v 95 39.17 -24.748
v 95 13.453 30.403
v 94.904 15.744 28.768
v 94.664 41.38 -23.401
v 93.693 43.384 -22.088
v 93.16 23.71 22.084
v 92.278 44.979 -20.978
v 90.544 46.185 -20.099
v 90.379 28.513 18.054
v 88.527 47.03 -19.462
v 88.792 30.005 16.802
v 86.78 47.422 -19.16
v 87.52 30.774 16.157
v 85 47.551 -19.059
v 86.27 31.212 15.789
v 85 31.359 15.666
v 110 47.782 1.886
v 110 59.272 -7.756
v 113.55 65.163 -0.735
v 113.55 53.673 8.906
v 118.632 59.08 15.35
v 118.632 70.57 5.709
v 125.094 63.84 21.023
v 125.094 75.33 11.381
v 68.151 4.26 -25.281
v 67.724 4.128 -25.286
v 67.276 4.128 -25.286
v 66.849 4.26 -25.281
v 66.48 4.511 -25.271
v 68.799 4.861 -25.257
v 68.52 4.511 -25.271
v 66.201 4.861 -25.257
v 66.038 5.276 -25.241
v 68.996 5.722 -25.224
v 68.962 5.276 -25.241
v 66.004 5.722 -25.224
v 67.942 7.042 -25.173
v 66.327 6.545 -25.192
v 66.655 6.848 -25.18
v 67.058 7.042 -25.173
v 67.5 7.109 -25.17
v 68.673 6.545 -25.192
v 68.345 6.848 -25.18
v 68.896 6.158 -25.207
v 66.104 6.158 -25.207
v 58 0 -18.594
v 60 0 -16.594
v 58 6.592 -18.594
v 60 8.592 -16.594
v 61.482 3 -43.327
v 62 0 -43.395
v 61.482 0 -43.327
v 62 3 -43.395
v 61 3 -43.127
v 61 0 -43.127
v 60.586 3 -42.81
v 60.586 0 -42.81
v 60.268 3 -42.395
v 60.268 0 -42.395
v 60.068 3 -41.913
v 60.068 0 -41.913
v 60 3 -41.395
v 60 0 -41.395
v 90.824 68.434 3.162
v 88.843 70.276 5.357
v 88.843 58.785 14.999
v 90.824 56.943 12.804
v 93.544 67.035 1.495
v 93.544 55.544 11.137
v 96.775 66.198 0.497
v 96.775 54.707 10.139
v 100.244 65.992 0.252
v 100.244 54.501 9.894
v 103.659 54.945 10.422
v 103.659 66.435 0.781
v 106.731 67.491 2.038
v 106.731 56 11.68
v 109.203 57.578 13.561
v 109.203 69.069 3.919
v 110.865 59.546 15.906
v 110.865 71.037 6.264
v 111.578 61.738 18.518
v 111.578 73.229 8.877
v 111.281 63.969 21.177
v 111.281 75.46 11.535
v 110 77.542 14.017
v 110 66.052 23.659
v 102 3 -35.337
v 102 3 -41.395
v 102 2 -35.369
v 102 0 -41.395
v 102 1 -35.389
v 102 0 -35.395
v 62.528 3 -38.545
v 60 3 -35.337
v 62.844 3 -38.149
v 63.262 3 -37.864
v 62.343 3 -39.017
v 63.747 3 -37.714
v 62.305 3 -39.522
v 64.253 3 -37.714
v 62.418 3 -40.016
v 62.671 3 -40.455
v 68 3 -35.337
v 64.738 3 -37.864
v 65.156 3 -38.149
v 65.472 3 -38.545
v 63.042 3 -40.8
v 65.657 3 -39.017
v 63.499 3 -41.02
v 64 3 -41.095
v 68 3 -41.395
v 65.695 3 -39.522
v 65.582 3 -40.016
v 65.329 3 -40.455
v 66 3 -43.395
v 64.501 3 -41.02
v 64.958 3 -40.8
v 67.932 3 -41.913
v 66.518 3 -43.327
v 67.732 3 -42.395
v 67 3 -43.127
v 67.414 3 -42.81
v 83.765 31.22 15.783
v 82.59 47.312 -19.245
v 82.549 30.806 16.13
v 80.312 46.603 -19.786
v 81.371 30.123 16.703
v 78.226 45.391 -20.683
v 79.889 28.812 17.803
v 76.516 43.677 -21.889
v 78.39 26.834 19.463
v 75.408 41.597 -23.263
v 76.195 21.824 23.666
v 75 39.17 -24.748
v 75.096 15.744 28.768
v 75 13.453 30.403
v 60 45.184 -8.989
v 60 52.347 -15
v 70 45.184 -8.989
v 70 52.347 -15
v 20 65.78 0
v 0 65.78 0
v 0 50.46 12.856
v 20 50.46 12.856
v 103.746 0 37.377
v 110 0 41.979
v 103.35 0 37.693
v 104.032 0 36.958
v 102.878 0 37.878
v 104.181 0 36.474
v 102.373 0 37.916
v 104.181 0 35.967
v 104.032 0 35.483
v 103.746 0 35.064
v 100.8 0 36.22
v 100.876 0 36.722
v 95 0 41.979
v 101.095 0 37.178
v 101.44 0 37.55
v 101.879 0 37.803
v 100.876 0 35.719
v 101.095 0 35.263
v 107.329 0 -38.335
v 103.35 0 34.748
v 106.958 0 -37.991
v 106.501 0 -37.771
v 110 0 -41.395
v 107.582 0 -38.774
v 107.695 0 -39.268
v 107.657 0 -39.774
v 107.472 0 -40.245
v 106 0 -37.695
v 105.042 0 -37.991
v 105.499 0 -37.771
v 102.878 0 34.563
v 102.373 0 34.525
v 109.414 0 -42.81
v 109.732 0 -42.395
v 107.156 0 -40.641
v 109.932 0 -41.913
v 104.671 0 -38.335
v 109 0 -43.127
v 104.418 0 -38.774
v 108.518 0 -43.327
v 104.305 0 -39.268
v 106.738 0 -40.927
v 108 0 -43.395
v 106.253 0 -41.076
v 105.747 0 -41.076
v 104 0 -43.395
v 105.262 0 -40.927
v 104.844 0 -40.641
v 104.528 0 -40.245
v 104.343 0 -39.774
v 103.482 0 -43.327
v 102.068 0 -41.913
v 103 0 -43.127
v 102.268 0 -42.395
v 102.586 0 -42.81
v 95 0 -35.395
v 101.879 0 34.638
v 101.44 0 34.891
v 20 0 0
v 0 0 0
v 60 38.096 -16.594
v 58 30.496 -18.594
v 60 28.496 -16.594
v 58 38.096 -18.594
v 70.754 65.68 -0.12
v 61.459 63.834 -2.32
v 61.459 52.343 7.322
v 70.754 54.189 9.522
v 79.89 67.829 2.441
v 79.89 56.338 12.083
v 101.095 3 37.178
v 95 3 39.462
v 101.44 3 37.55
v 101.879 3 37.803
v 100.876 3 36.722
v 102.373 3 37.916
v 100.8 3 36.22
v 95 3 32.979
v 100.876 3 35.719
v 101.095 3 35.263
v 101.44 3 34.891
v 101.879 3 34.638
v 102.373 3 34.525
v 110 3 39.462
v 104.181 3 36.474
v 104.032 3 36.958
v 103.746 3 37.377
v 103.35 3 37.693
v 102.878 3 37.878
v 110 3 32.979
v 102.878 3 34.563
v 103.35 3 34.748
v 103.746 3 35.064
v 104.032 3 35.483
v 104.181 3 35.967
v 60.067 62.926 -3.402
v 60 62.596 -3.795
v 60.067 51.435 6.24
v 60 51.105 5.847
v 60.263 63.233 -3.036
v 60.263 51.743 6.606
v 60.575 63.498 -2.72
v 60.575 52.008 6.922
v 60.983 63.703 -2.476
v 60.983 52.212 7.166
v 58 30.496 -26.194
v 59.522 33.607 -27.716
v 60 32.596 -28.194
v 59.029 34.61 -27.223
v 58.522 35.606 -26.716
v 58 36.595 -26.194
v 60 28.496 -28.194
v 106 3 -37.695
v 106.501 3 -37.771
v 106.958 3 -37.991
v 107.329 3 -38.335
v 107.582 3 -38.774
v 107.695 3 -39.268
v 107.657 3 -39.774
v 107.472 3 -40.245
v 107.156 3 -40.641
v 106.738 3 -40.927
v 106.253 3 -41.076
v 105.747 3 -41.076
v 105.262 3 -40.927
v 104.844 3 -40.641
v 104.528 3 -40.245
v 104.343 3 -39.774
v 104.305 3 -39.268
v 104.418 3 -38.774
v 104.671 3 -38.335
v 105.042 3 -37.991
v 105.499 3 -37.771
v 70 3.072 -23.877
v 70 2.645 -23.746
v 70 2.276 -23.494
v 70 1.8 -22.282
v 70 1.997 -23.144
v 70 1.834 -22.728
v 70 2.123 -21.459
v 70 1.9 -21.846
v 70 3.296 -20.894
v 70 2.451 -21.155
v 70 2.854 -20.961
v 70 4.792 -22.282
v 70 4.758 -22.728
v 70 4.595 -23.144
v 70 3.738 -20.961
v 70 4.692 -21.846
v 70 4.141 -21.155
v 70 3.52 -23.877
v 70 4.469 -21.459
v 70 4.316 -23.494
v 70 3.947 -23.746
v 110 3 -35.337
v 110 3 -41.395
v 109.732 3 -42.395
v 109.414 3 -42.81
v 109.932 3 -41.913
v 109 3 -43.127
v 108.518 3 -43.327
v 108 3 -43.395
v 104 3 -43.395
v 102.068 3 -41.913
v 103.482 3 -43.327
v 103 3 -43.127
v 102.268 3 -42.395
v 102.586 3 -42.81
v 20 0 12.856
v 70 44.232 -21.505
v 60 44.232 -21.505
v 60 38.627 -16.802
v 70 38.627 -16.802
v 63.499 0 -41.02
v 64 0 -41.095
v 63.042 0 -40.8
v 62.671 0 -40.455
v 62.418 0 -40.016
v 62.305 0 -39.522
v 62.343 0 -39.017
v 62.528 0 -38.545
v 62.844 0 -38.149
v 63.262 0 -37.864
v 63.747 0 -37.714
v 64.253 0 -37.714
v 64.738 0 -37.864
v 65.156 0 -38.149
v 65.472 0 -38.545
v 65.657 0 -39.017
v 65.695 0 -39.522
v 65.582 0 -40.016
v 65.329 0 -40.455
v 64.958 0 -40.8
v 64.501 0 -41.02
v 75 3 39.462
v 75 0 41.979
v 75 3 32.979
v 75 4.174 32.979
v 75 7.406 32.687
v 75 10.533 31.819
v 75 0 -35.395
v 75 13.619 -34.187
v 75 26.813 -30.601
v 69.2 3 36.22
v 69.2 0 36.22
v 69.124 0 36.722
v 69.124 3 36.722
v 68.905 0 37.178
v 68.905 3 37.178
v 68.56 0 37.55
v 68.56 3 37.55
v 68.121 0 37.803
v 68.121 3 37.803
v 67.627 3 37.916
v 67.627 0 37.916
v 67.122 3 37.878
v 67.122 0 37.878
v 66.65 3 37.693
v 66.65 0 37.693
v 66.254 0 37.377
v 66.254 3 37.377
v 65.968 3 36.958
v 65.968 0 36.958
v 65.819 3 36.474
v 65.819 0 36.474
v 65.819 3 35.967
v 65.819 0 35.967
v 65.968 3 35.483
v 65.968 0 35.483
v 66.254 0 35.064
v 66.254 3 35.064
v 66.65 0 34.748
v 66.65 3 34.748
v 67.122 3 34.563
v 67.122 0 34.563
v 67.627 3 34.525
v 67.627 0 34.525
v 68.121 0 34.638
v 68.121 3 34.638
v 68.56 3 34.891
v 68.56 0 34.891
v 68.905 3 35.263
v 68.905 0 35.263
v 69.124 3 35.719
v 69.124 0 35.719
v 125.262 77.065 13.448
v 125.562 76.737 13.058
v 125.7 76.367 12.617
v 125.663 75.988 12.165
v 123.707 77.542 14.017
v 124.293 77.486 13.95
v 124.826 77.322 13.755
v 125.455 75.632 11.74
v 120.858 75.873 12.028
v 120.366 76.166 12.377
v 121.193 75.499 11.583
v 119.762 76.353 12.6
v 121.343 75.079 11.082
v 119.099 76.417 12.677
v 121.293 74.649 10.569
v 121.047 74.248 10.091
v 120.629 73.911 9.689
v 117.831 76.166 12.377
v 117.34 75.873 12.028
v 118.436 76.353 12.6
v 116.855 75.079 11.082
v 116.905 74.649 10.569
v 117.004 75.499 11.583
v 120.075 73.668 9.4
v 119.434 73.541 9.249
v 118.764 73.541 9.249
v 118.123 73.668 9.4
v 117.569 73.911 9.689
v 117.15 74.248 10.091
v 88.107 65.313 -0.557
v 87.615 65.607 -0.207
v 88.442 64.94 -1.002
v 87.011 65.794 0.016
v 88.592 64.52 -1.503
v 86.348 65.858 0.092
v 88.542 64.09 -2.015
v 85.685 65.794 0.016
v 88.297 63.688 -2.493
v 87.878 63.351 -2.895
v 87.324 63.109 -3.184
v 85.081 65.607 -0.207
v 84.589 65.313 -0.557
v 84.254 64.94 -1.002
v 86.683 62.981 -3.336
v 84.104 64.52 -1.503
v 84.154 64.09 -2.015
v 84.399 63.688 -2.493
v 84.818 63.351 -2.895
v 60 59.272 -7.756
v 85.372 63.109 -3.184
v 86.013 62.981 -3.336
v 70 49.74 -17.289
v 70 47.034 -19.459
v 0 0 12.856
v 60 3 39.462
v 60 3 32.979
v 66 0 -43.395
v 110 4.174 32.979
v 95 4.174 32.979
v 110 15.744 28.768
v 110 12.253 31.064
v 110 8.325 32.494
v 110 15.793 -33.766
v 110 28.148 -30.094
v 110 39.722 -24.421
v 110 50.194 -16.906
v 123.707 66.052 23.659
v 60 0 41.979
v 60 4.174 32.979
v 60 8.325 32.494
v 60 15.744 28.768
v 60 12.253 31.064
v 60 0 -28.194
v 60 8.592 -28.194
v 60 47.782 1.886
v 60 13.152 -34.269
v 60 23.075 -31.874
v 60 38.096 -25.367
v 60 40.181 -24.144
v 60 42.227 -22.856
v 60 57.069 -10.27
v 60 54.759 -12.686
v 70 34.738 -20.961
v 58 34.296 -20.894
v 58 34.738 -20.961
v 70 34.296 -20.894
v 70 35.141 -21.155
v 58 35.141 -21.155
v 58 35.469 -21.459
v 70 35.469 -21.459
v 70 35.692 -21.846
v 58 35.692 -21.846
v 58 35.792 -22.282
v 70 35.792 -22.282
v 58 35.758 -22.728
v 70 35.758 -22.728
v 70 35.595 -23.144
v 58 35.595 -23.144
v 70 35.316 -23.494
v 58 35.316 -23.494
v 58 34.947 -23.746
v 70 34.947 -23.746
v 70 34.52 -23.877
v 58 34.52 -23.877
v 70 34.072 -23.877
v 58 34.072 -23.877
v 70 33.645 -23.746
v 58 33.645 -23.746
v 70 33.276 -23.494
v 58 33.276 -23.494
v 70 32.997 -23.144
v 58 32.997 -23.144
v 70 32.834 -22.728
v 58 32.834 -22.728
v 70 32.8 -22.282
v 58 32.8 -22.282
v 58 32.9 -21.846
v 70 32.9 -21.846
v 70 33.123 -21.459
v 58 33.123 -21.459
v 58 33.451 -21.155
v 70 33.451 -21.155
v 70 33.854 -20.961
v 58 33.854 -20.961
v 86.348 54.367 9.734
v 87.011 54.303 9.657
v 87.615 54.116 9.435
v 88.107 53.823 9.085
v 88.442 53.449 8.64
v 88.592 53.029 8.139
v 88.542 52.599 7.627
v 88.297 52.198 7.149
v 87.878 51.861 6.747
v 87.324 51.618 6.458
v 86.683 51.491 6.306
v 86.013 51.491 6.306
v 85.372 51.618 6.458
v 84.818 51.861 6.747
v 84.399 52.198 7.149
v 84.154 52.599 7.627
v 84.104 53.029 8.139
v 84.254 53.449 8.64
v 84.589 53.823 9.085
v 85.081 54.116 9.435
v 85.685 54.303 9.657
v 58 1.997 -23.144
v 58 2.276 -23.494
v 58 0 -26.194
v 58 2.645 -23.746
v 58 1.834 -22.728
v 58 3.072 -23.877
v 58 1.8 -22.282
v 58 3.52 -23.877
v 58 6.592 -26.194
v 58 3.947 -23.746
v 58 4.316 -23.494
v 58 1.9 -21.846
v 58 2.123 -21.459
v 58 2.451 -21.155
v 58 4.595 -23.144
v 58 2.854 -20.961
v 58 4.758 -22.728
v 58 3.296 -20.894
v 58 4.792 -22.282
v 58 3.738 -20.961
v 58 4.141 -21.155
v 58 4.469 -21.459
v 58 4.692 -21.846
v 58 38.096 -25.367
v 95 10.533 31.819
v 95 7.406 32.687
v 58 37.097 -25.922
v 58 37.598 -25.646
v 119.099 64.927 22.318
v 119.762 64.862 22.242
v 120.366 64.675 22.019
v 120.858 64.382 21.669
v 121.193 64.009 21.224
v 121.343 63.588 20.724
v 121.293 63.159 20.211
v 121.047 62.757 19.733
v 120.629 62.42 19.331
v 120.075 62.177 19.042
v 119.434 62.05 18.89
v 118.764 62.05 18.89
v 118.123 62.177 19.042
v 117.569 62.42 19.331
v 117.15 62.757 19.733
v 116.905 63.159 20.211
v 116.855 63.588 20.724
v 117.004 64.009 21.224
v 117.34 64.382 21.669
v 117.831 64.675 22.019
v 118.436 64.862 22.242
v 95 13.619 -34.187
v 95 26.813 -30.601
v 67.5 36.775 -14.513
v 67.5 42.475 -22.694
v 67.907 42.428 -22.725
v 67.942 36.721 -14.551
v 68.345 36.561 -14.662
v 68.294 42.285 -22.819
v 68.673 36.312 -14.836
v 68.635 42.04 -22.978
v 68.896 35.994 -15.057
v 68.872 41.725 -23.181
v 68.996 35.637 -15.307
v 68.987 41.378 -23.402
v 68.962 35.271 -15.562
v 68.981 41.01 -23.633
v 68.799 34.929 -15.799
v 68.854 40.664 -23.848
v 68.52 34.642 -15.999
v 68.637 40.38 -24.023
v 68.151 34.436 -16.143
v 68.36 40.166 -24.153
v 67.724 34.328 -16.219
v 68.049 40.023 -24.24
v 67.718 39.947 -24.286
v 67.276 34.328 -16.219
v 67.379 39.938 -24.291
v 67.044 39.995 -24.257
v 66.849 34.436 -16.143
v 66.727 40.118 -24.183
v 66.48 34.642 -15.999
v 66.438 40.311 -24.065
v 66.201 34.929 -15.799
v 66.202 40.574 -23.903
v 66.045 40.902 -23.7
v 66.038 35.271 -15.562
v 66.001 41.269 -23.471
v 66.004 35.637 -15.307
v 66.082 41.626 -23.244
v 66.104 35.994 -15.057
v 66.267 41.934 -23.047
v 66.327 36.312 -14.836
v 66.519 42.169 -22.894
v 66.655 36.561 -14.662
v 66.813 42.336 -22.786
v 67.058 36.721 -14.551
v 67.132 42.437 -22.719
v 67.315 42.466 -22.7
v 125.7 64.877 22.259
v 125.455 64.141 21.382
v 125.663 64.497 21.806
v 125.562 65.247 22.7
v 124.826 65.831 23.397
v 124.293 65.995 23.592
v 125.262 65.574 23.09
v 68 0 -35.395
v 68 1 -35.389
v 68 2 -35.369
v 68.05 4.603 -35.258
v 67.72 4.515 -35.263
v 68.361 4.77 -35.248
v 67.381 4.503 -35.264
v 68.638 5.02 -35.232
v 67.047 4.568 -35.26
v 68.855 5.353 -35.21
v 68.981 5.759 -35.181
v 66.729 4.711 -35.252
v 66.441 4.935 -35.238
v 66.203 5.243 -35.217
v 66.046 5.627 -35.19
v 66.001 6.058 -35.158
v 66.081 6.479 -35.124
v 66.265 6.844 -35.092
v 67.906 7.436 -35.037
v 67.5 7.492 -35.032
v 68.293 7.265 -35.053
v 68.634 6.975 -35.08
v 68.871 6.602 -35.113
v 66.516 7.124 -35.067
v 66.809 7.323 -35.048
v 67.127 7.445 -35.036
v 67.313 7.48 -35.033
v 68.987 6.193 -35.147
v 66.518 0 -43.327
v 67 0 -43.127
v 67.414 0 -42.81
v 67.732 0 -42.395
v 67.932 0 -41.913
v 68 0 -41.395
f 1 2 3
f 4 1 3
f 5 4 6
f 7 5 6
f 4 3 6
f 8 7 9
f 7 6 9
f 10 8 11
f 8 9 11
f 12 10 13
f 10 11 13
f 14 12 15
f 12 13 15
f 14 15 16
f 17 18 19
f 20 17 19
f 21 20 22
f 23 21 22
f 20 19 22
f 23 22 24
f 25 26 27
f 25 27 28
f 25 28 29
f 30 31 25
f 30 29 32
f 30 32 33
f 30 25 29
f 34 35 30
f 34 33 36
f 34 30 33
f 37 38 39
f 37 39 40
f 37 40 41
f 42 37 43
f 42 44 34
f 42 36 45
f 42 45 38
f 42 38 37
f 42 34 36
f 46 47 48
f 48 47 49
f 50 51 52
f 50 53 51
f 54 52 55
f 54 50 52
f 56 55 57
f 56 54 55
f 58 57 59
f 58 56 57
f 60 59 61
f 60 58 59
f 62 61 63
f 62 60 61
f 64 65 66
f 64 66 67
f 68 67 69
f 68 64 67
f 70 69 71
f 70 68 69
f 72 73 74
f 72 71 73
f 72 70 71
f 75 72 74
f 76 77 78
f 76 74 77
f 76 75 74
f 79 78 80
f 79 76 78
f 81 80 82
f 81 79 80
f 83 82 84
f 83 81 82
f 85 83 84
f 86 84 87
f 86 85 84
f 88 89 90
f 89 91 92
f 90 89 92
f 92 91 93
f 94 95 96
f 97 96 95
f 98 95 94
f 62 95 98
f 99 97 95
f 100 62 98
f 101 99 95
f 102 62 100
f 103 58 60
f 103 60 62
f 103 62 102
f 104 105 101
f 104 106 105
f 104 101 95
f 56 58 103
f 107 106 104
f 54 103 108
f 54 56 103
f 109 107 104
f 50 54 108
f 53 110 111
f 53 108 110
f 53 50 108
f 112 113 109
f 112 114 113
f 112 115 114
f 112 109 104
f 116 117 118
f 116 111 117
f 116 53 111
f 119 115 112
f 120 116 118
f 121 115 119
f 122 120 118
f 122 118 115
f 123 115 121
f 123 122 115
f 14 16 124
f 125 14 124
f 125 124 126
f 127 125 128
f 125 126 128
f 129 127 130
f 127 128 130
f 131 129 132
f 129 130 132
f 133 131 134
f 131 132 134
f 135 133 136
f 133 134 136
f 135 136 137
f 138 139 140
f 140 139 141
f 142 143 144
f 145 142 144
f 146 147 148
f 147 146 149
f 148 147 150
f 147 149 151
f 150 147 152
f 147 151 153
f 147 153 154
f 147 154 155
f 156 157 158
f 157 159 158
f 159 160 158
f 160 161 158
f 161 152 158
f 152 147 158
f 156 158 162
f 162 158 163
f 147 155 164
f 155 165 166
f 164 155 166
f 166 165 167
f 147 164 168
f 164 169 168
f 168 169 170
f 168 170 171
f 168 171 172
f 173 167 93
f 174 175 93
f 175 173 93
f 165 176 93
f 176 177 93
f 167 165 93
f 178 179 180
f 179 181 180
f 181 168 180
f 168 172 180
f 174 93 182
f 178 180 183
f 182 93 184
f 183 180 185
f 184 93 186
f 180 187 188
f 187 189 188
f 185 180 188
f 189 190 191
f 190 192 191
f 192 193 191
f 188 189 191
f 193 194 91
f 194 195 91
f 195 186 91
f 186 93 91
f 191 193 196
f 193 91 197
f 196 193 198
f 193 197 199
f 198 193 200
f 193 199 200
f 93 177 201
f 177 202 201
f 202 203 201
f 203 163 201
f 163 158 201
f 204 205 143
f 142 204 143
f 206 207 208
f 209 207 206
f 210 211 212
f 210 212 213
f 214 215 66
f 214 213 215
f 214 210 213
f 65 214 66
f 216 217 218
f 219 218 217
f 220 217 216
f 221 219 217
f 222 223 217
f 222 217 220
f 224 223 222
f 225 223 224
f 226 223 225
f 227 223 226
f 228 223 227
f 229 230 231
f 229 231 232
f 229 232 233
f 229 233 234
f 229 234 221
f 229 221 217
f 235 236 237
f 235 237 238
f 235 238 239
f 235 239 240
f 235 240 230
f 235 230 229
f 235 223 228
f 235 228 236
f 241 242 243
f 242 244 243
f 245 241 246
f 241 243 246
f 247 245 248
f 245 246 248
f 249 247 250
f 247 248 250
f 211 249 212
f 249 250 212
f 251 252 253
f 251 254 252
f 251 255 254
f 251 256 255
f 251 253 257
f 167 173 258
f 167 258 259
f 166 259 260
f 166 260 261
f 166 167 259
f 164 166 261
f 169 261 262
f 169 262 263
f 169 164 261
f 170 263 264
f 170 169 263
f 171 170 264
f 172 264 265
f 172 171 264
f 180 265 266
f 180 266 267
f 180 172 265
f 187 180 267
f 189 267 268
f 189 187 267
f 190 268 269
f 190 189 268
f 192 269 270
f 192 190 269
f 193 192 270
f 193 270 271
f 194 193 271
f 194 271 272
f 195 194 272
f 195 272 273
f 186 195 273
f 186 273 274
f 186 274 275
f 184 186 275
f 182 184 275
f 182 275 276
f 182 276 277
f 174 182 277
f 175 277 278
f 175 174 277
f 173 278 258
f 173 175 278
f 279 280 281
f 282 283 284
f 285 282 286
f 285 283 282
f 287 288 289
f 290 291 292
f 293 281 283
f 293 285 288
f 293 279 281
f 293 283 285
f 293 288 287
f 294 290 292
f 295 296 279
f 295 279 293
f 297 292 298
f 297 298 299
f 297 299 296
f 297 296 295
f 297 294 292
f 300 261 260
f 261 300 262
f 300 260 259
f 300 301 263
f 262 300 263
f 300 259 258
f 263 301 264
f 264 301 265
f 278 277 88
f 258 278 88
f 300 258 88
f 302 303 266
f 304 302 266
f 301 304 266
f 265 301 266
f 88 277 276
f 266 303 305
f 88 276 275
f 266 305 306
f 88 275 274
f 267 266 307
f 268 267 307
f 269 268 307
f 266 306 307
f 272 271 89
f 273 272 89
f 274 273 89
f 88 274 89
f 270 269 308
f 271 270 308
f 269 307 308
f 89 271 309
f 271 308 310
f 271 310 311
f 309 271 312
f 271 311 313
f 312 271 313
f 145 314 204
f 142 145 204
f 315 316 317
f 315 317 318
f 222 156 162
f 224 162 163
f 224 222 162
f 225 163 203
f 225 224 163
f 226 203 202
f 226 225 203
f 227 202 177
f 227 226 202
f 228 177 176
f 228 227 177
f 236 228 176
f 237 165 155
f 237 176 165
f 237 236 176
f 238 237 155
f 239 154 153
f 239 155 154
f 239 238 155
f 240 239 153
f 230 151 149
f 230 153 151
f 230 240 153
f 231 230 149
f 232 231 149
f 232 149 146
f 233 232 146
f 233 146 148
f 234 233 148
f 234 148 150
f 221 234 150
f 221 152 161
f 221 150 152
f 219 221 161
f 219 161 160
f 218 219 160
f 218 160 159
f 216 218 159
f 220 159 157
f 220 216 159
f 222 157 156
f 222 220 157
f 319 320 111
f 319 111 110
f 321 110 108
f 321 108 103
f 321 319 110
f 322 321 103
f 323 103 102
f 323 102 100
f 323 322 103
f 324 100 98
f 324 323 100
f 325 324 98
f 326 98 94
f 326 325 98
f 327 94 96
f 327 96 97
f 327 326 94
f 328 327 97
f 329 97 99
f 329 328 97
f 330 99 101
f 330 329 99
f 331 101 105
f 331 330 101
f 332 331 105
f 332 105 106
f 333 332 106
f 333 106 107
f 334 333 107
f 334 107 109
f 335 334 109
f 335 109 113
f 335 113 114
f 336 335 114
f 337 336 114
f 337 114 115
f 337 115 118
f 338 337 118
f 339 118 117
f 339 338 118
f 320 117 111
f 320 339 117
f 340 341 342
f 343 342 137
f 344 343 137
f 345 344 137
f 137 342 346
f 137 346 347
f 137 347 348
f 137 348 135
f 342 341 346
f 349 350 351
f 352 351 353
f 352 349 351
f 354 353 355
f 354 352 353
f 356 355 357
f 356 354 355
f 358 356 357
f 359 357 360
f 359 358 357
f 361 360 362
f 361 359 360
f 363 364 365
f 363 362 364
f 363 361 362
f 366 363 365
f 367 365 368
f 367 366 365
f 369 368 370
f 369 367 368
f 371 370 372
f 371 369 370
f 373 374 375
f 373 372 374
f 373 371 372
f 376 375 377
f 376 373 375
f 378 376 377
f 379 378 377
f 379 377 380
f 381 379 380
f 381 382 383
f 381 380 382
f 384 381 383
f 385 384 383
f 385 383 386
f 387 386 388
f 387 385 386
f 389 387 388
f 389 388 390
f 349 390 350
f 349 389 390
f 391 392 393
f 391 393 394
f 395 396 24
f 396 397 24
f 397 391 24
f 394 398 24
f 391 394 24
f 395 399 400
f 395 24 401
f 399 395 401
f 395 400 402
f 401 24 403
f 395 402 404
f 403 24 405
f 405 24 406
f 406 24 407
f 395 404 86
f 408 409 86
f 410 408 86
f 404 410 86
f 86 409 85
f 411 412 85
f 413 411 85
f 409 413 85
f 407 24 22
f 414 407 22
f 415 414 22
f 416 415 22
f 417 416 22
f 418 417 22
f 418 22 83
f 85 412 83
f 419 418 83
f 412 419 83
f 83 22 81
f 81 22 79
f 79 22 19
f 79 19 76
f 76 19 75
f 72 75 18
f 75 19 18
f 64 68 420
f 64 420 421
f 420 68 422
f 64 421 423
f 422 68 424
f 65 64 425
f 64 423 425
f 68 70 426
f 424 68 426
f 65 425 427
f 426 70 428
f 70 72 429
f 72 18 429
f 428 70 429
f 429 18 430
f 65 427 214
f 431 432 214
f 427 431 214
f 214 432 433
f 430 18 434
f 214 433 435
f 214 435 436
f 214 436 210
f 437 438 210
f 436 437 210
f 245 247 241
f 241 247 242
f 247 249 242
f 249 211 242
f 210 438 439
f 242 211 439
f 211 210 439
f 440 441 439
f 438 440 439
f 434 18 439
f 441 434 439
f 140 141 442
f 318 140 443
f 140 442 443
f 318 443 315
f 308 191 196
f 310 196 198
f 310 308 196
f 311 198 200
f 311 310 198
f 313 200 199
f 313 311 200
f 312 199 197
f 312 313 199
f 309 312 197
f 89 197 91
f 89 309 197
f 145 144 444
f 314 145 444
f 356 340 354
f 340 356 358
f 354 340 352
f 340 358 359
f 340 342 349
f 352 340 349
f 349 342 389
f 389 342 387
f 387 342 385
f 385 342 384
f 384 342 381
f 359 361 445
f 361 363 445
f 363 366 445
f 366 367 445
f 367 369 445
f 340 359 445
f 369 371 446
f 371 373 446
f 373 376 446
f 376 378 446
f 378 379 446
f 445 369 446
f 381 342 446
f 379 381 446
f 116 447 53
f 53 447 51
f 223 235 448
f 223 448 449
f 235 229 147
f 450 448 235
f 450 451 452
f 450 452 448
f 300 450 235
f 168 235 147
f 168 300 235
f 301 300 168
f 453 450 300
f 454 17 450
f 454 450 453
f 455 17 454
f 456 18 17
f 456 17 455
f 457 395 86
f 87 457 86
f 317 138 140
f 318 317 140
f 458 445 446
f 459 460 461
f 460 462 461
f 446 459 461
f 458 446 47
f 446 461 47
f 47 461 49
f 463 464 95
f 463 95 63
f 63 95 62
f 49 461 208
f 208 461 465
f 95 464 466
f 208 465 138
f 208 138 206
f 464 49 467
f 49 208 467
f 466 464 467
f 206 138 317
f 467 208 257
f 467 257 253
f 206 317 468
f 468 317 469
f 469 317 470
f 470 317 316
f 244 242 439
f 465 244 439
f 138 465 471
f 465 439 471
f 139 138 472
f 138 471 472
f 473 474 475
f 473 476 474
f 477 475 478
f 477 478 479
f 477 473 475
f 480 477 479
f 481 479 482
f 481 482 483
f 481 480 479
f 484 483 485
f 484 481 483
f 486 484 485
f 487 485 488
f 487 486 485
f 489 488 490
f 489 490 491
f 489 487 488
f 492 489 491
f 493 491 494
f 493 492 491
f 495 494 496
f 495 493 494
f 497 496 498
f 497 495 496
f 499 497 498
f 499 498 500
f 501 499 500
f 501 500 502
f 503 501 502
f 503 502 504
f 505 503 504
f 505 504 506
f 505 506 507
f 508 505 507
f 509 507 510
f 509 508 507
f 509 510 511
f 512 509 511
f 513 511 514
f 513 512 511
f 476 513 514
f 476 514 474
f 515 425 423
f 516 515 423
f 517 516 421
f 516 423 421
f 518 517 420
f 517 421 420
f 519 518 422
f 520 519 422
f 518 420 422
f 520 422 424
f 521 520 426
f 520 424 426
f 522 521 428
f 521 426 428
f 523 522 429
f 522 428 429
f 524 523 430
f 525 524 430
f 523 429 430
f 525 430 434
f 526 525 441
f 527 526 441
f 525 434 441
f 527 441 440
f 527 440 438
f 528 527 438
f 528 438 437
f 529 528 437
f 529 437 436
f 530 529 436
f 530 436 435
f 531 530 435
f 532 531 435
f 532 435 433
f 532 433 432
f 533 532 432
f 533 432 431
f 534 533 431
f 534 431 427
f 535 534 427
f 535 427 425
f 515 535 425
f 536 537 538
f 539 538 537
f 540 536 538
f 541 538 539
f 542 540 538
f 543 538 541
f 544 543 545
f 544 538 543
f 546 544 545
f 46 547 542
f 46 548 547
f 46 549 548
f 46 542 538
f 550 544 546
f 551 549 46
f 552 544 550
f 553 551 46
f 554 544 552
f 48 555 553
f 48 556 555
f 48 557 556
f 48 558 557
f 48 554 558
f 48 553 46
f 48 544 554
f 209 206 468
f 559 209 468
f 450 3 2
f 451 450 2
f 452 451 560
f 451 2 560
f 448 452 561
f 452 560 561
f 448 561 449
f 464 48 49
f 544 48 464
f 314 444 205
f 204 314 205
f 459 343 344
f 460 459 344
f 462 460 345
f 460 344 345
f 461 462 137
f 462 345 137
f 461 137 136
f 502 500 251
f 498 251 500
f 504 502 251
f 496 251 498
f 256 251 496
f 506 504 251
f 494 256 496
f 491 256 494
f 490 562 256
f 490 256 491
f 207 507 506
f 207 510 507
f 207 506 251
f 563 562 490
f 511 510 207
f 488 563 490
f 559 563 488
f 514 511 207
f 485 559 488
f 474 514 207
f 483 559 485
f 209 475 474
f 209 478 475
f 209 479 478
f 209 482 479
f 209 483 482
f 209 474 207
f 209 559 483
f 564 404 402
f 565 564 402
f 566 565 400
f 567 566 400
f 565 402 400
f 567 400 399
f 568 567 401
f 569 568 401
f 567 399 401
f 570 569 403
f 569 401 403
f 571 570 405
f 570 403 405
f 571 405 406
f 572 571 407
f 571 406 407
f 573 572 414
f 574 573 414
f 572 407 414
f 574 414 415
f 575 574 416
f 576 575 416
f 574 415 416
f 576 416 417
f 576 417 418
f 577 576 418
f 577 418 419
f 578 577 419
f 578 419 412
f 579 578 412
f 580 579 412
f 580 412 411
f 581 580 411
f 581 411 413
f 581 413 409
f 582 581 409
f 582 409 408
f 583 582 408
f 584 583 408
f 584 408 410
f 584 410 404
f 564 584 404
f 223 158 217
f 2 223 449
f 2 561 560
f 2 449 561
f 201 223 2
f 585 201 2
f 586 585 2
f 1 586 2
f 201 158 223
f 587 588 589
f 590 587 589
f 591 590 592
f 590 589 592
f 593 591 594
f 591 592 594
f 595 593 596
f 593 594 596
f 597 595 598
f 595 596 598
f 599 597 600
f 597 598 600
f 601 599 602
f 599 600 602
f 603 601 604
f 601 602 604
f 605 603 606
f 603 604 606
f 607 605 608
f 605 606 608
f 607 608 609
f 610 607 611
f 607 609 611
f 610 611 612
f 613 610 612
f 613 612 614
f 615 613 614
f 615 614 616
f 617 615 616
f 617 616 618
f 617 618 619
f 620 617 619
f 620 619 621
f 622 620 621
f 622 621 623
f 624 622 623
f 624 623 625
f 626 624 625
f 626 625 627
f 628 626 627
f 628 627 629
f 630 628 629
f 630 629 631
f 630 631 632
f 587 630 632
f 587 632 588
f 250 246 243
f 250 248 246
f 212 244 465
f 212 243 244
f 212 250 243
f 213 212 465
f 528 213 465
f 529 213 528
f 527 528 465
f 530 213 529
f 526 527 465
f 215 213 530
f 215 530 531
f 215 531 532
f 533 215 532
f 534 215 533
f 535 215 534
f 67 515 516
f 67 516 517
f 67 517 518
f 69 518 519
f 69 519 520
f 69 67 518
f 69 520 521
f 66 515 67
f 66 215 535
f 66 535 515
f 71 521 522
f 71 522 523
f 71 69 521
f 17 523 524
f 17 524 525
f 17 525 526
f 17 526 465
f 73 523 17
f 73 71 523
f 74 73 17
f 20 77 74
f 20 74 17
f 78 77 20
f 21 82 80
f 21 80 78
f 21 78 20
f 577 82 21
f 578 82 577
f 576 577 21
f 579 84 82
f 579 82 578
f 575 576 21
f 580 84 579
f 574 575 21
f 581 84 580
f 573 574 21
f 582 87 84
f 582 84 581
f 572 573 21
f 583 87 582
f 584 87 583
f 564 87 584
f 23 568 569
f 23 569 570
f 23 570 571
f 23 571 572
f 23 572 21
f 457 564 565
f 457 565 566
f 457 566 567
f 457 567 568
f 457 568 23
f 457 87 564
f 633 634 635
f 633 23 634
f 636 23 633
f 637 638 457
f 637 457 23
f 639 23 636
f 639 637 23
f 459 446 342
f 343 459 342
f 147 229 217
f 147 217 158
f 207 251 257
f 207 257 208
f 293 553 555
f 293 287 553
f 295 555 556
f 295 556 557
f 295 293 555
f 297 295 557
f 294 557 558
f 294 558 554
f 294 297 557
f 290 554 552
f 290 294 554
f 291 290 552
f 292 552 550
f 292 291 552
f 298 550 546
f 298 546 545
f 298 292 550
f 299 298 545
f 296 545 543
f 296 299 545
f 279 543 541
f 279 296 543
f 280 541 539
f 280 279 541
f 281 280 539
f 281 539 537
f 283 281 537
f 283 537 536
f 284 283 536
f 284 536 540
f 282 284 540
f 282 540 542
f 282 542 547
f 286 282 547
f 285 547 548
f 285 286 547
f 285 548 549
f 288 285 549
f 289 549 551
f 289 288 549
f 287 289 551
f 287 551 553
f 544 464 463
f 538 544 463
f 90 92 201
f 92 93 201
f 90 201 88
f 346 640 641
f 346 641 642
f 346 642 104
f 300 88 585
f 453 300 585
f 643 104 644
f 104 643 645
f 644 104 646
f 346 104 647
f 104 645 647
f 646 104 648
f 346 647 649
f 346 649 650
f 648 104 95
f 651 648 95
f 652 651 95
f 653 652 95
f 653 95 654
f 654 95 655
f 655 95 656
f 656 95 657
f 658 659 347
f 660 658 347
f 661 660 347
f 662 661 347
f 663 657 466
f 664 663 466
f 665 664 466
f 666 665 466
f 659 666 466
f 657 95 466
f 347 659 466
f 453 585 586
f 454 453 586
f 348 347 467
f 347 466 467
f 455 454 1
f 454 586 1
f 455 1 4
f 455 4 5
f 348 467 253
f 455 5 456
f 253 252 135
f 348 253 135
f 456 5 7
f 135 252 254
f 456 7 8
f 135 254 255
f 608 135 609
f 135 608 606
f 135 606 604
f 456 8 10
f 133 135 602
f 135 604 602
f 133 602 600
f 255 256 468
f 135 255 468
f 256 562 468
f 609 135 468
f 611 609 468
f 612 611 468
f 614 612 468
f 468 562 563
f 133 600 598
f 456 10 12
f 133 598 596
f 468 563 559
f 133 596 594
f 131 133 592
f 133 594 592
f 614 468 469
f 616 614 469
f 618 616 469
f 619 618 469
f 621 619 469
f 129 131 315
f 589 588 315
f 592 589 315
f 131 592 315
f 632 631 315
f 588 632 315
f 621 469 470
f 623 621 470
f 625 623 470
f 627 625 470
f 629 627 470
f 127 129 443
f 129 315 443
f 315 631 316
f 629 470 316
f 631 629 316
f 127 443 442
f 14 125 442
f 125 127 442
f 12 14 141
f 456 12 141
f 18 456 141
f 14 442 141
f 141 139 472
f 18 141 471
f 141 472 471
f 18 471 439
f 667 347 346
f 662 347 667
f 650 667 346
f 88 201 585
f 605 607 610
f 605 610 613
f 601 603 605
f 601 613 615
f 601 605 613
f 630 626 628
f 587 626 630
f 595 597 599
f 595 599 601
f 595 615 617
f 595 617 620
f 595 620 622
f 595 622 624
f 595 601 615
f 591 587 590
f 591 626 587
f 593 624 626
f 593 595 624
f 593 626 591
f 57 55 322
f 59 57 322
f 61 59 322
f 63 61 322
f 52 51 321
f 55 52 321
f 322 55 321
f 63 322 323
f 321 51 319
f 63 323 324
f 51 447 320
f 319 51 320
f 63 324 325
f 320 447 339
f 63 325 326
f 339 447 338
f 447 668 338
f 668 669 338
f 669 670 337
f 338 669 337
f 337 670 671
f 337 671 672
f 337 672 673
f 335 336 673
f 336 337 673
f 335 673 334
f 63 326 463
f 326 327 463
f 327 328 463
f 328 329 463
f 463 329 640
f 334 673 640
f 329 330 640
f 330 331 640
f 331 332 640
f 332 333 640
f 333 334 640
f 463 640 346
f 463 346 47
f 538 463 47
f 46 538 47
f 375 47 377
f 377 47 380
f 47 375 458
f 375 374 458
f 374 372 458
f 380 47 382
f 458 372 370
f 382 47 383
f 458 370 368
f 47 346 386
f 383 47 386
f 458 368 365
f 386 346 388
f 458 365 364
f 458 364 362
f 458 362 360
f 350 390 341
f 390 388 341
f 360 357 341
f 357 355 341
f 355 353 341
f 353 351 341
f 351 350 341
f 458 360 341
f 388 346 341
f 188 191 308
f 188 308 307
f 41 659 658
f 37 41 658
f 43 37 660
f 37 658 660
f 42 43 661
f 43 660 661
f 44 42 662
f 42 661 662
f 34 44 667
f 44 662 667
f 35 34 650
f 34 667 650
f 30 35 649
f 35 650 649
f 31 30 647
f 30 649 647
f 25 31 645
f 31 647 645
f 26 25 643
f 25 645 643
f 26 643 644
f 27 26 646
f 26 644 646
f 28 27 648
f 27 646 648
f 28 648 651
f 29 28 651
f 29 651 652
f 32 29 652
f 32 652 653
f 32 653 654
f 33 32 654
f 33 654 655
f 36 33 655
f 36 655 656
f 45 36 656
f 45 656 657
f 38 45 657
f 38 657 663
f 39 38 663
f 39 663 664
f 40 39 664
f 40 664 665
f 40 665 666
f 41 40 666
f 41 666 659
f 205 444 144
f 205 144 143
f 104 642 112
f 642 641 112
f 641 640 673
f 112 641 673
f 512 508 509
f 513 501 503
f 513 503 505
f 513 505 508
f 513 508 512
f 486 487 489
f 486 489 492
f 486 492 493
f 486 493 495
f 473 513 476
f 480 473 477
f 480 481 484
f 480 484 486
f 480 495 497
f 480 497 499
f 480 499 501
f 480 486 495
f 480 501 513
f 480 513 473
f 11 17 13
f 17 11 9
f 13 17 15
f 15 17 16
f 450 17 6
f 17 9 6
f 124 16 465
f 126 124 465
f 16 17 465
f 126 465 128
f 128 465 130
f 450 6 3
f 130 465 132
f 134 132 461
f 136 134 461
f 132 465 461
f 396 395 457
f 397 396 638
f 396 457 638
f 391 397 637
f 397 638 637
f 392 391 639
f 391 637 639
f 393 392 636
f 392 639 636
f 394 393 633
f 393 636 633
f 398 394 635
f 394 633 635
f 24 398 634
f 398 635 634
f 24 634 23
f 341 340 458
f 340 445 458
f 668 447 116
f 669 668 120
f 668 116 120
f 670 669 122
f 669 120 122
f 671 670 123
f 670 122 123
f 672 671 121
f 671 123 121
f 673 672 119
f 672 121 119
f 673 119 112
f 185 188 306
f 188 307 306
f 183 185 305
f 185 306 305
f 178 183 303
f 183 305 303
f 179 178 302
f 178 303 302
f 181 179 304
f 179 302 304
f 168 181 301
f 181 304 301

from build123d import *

# Parameters (mm, degrees)
AUFSATZ_LINEAR_AUSTRAGEN1_DEPTH   = 20
AUFSATZ_LINEAR_AUSTRAGEN2_DEPTH   = 20
AUFSATZ_LINEAR_AUSTRAGEN2_2_DEPTH = 20
AUFSATZ_LINEAR_AUSTRAGEN3_DEPTH   = 50
AUFSATZ_LINEAR_AUSTRAGEN4_DEPTH   = 20
SKIZZE5_R                         = 2.2499999999999347
SKIZZE5_R_2                       = 2.2499999999999964
SCHNITT_LINEAR_AUSTRAGEN1_DEPTH   = 154.92337827661623
AUFSATZ_LINEAR_AUSTRAGEN5_DEPTH   = 50
VERRUNDUNG3_R                     = 2
SKIZZE10_R                        = 2.2499999999999964
SCHNITT_LINEAR_AUSTRAGEN2_DEPTH   = 154.9233782766163
SCHNITT_LINEAR_AUSTRAGEN3_DEPTH   = 5
SKIZZE12_W                        = 19.999999999999993
SKIZZE12_H                        = 50
SKIZZE12_W_2                      = 20.000000000000014
SCHNITT_LINEAR_AUSTRAGEN4_DEPTH   = 163.42500642504442
VERRUNDUNG5_R                     = 10
VERRUNDUNG6_R                     = 10
SKIZZE13_R                        = 1.6999999999999995
SKIZZE13_R_2                      = 1.700000000000026
AUFSATZ_LINEAR_AUSTRAGEN9_DEPTH   = 3
VERRUNDUNG7_R                     = 2
VERRUNDUNG8_R                     = 2
SCHNITT_LINEAR_AUSTRAGEN5_DEPTH   = 156.1930410648953
VERRUNDUNG9_R                     = 18
SKIZZE15_R                        = 1.6999999999999995
SCHNITT_LINEAR_AUSTRAGEN6_DEPTH   = 156.1930410648953
VERRUNDUNG10_R                    = 2
SKIZZE18_W                        = 119.99999999999997
SKIZZE18_H                        = 10.2
SCHNITT_LINEAR_AUSTRAGEN8_DEPTH   = 10
VERRUNDUNG12_R                    = 18
VERRUNDUNG13_R                    = 2
SKIZZE16_R                        = 102.01235542308495
SCHNITT_LINEAR_AUSTRAGEN7_DEPTH   = 189.02894525437085
SKIZZE19_R                        = 1.5000000000000009
SKIZZE19_R_2                      = 1.5000000000000007
SCHNITT_LINEAR_AUSTRAGEN9_DEPTH   = 10
SKIZZE20_R                        = 2.4999999999999987
SKIZZE20_R_2                      = 1.5000000000000007
SKIZZE20_R_3                      = 1.5000000000000009
AUFSATZ_LINEAR_AUSTRAGEN11_DEPTH  = 2
FASE1_SIZE                        = 2
SKIZZE21_R                        = 1.4999999999999973
SCHNITT_LINEAR_AUSTRAGEN12_DEPTH  = 10
SKIZZE22_R                        = 1.4999999999999971
SCHNITT_LINEAR_AUSTRAGEN13_DEPTH  = 10


with BuildPart() as part:
    # Skizze1 → Aufsatz-Linear austragen1 (new body)
    with BuildSketch(Plane(origin=(0, 0, 0), x_dir=(0, 0, -1), z_dir=(1, 0, 0))):
        Polygon((0, 0), (-1.209e-14, 65.78044443118975), (-12.855752193730883, 50.45955556881026), (-12.855752193730876, -2.36e-15), align=None)
    extrude(amount=AUFSATZ_LINEAR_AUSTRAGEN1_DEPTH)


with BuildPart() as body_2:
    # Skizze2 → Aufsatz-Linear austragen2 (new body)
    with BuildSketch(Plane(origin=(0, 38.60154936639293, -32.390545836212254), x_dir=(-1, 0, 0), z_dir=(0, 0.7660444431189743, -0.6427876096865437))):
        with BuildLine():
            Line((89.99999999999999, 60.58092012780532), (90, 32.15785464004299))
            Line((90, 32.15785464004299), (40, 32.157854640043))
            Line((40, 32.157854640043), (39.99999999999999, 38.85026313842354))
            ThreePointArc((39.99999999999999, 38.85026313842354), (65.782949027453, 47.914106689894396), (89.99999999999999, 60.58092012780532))
        make_face()
    extrude(amount=-AUFSATZ_LINEAR_AUSTRAGEN2_DEPTH)

    # Skizze4 → Aufsatz-Linear austragen3 (add)
    with BuildSketch(Plane.ZY.offset(90.00000000000001)):
        with BuildLine():
            ThreePointArc((-7.756199986579628, 59.27221988311346), (-28.14591240579339, 32.699829313458416), (-35.39529003392221, -6.94e-15))
            Line((-35.39529003392221, -6.94e-15), (41.979097856400095, -6.94e-15))
            Line((41.979097856400095, -6.94e-15), (5.099552207151247, 43.951331020733974))
            Line((5.099552207151247, 43.951331020733974), (-7.756199986579628, 59.27221988311346))
        make_face()
    extrude(amount=-AUFSATZ_LINEAR_AUSTRAGEN3_DEPTH)



with BuildPart() as body_3:
    # Skizze2 → Aufsatz-Linear austragen2 2 (new body)
    with BuildSketch(Plane(origin=(0, 38.60154936639293, -32.390545836212254), x_dir=(-1, 0, 0), z_dir=(0, 0.7660444431189743, -0.6427876096865437))):
        with BuildLine():
            Line((-109.99999999999997, 60.58092012780532), (-109.99999999999999, 32.15785464004299))
            Line((-109.99999999999999, 32.15785464004299), (-60.00000000000001, 32.157854640043))
            Line((-60.00000000000001, 32.157854640043), (-60, 38.85026313842354))
            ThreePointArc((-60, 38.85026313842354), (-85.78294902745297, 47.91410668989437), (-109.99999999999997, 60.58092012780532))
        make_face()
    extrude(amount=-AUFSATZ_LINEAR_AUSTRAGEN2_2_DEPTH)


with BuildPart() as body_2_1:
    add(body_2.part)

    add(body_3.part)  # Aufsatz-Linear austragen4 merges body 3
    # Skizze6 → Aufsatz-Linear austragen4 (add)
    with BuildSketch(Plane(origin=(0, 38.601549366392966, -32.39054583621228), x_dir=(1, 0, 0), z_dir=(0, 0.7660444431189745, -0.6427876096865438))):
        with BuildLine():
            ThreePointArc((-90, -32.15785464004299), (-97.30849227277704, -47.841026986521875), (-109.01622804444871, -60.58092012780532))
            Line((-109.01622804444871, -60.58092012780532), (-89.99999999999996, -60.58092012780531))
            Line((-89.99999999999996, -60.58092012780531), (-90, -32.15785464004299))
        make_face()
        with BuildLine():
            ThreePointArc((110.00000000000001, -32.157854640043034), (117.30849227277703, -47.84102698652191), (129.01622804444872, -60.580920127805356))
            Line((129.01622804444872, -60.580920127805356), (110, -60.580920127805335))
            Line((110, -60.580920127805335), (110.00000000000001, -32.157854640043034))
        make_face()
    extrude(amount=-AUFSATZ_LINEAR_AUSTRAGEN4_DEPTH)

    # Skizze5 → Schnitt-Linear austragen1 (cut, through all)
    with BuildSketch(Plane(origin=(0, 38.601549366392966, -32.39054583621228), x_dir=(1, 0, 0), z_dir=(0, 0.7660444431189745, -0.6427876096865438))):
        with Locations(Location((-67.93678140390588, -39.2901785012674, 0), (0, 0, 270))):
            Circle(SKIZZE5_R)
        with BuildLine():
            ThreePointArc((-68.8427839392676, -49.276117644901774), (-85.25507840084563, -44.01063116187818), (-90, -60.58092012780534))
            ThreePointArc((-89.99999999999999, -60.58092012780534), (-79.59986038817945, -54.59451084889355), (-68.84278393926756, -49.2761176449018))
        make_face()
        with Locations(Location((-98.80470560431883, -55.787792133473864, 0), (0, 0, 270))):
            Circle(SKIZZE5_R_2)
        with BuildLine():
            ThreePointArc((110.00000000000003, -60.580920127805335), (93.94464237551333, -65.17839053590887), (88.84278393926762, -49.27611764490177))
            ThreePointArc((88.84278393926762, -49.27611764490177), (105.25507840084566, -44.01063116187818), (110.00000000000003, -60.580920127805335))
        make_face()
    extrude(amount=-SCHNITT_LINEAR_AUSTRAGEN1_DEPTH, mode=Mode.SUBTRACT)

    # Skizze7 → Aufsatz-Linear austragen5 (add)
    with BuildSketch(Plane(origin=(60.00000000000004, 3.999e-14, 4.766e-14), x_dir=(7.9e-16, 0, -1), z_dir=(1, 6.7e-16, 7.9e-16))):
        with BuildLine():
            Line((7.756199986579595, 59.272219883113486), (-41.979097856400124, 1.817e-14))
            Line((-41.979097856400124, 1.817e-14), (35.39529003392218, 1.817e-14))
            ThreePointArc((35.39529003392218, 1.817e-14), (28.145912405793332, 32.69982931345845), (7.756199986579595, 59.272219883113486))
        make_face()
    extrude(amount=AUFSATZ_LINEAR_AUSTRAGEN5_DEPTH)

    # Verrundung3
    verrundung3_edges = [body_2_1.edges().sort_by_distance(p)[0] for p in [
        (-109.01622804444871, 69.88176977676663, 20.445007483592853),
    ]]
    fillet(verrundung3_edges, radius=VERRUNDUNG3_R)

    # Skizze10 → Schnitt-Linear austragen2 (cut, through all)
    with BuildSketch(Plane(origin=(0, 38.601549366392966, -32.39054583621228), x_dir=(1, 0, 0), z_dir=(0, 0.7660444431189745, -0.6427876096865438))):
        with Locations(Location((86.34802459849006, -40.15329039482156, 0), (0, 0, 270))):
            Circle(SKIZZE10_R)
        with Locations(Location((119.09894185825529, -56.58092012780534, 0), (0, 0, 270))):
            Circle(SKIZZE10_R)
    extrude(amount=-SCHNITT_LINEAR_AUSTRAGEN2_DEPTH, mode=Mode.SUBTRACT)

    # Skizze11 → Schnitt-Linear austragen3 (cut)
    with BuildSketch(Plane(origin=(0, 23.28066050401348, -19.534793642481407), x_dir=(1, 0, 0), z_dir=(0, -0.7660444431189745, 0.6427876096865438))):
        Polygon((60.00000000000001, 32.15785464004304), (109.99999999999999, 32.1578546400431), (141.02821228777057, 65.90002397102104), (38.34357710817464, 62.992820090396236), align=None)
    extrude(amount=-SCHNITT_LINEAR_AUSTRAGEN3_DEPTH, mode=Mode.SUBTRACT)

    # Skizze12 → Schnitt-Linear austragen4 (cut, through all)
    with BuildSketch(Plane(origin=(-8.12e-15, 16.620901993437233, -35.64363935003694), x_dir=(-1, 3.1e-16, 3.7e-16), z_dir=(0, 0.4226182617407026, -0.9063077870366486))):
        with Locations((65, 10.041304052055779)):
            Rectangle(SKIZZE12_W, SKIZZE12_H)
        with Locations((-85.00000000000011, 10.041304052055779)):
            Rectangle(SKIZZE12_W_2, SKIZZE12_H)
    extrude(amount=-SCHNITT_LINEAR_AUSTRAGEN4_DEPTH, mode=Mode.SUBTRACT)

    # Verrundung5
    verrundung5_edges = [body_2_1.edges().sort_by_distance(p)[0] for p in [
        (75.0000000000001, 39.4549061743576, -1.6965302152626833),
        (95.0000000000001, 39.45490617435759, -1.696530215262662),
    ]]
    fillet(verrundung5_edges, radius=VERRUNDUNG5_R - 0.0001)  # a hair under: the kernel refuses the full size

    # Verrundung6
    verrundung6_edges = [body_2_1.edges().sort_by_distance(p)[0] for p in [
        (-54.999999999999986, 39.45490617435774, -1.6965302152628254),
        (-75, 39.454906174357745, -1.6965302152628183),
    ]]
    fillet(verrundung6_edges, radius=VERRUNDUNG6_R - 0.0001)  # a hair under: the kernel refuses the full size

    # Skizze13 → Aufsatz-Linear austragen9 (add)
    # profile 1 of 4: a face of its own
    with BuildSketch(Plane(origin=(0, 0, 0), x_dir=(1, 0, 0), z_dir=(0, 1, 0))):
        Polygon((-40.00000000000001, 35.395290033922194), (-40, 43.39529003392219), (-48, 43.39529003392219), (-48, 35.395290033922194), (-48, 33.39585128291134), (-40.00000000000001, 33.39585128291134), align=None)
        with Locations(Location((-44, 39.395290033922194, 0), (0, 0, 270))):
            Circle(SKIZZE13_R, mode=Mode.SUBTRACT)
    # profile 2 of 4: a face of its own
    with BuildSketch(Plane(origin=(0, 0, 0), x_dir=(1, 0, 0), z_dir=(0, 1, 0))):
        Polygon((-90.00000000000003, 43.39529003392219), (-82.00000000000003, 43.39529003392219), (-82.00000000000003, 35.395290033922194), (-82.00000000000003, 33.39585128291134), (-90.00000000000003, 33.39585128291134), (-90.00000000000003, 35.395290033922194), align=None)
        with Locations(Location((-86.00000000000003, 39.395290033922194, 0), (0, 0, 90))):
            Circle(SKIZZE13_R, mode=Mode.SUBTRACT)
    # profile 3 of 4: a face of its own
    with BuildSketch(Plane(origin=(0, 0, 0), x_dir=(1, 0, 0), z_dir=(0, 1, 0))):
        Polygon((68.00000000000006, 33.39585128291134), (68.00000000000006, 35.395290033922194), (68.00000000000006, 43.39529003392219), (60.00000000000006, 43.39529003392219), (60.000000000000064, 35.39529003392213), (60.000000000000064, 33.39585128291134), align=None)
        with Locations(Location((64.00000000000006, 39.395290033922194, 0), (0, 0, 90))):
            Circle(SKIZZE13_R, mode=Mode.SUBTRACT)
    # profile 4 of 4: a face of its own
    with BuildSketch(Plane(origin=(0, 0, 0), x_dir=(1, 0, 0), z_dir=(0, 1, 0))):
        Polygon((110.0000000000001, 33.39585128291134), (102.00000000000007, 33.39585128291134), (102.00000000000007, 35.395290033922194), (102.00000000000007, 43.39529003392219), (110.0000000000001, 43.39529003392219), (110.0000000000001, 35.395290033922194), align=None)
        with Locations(Location((106.00000000000009, 39.395290033922194, 0), (0, 0, 270))):
            Circle(SKIZZE13_R_2, mode=Mode.SUBTRACT)
    extrude(amount=AUFSATZ_LINEAR_AUSTRAGEN9_DEPTH)

    # Verrundung7
    verrundung7_edges = [body_2_1.edges().sort_by_distance(p)[0] for p in [
        (-40, 1.5, -43.39529003392219),
        (-48, 1.5, -43.39529003392219),
        (-90.00000000000003, 1.5, -43.39529003392219),
        (-82.00000000000003, 1.5, -43.39529003392219),
    ]]
    fillet(verrundung7_edges, radius=VERRUNDUNG7_R)

    # Verrundung8
    verrundung8_edges = [body_2_1.edges().sort_by_distance(p)[0] for p in [
        (60.00000000000006, 1.5, -43.39529003392219),
        (68.00000000000006, 1.5, -43.39529003392219),
        (102.00000000000007, 1.5, -43.39529003392219),
        (110.0000000000001, 1.5, -43.39529003392219),
    ]]
    fillet(verrundung8_edges, radius=VERRUNDUNG8_R)

    # Skizze14 → Schnitt-Linear austragen5 (cut, through all)
    with BuildSketch(Plane(origin=(9.4e-16, 2.9999999999999933, 0), x_dir=(-1, 3.1e-16, 0), z_dir=(-3.1e-16, -1, 0))):
        Polygon((90.00000000000001, -32.97909785640016), (74.99999999999999, -32.97909785640016), (74.99999999999999, -41.9790978564003), (89.99999999999999, -41.97909785640014), align=None)
        Polygon((39.99999999999998, -41.97909785640012), (39.999999999999936, -32.97909785640016), (54.999999999999964, -32.97909785640016), (54.999999999999986, -41.9790978564003), align=None)
        Polygon((-59.99999999999996, -32.97909785640016), (-74.99999999999999, -32.97909785640016), (-75.00000000000001, -41.9790978564003), (-60.00000000000001, -41.97909785640017), align=None)
        Polygon((-110, -41.97909785640014), (-110.00000000000003, -32.97909785640016), (-95, -32.97909785640016), (-95, -41.9790978564003), align=None)
    extrude(amount=-SCHNITT_LINEAR_AUSTRAGEN5_DEPTH, mode=Mode.SUBTRACT)

    # Verrundung9
    verrundung9_edges = [body_2_1.edges().sort_by_distance(p)[0] for p in [
        (-47.49999999999998, 10.725782333347722, 32.97909785640016),
        (-82.49999999999999, 10.72578233334775, 32.97909785640016),
    ]]
    fillet(verrundung9_edges, radius=VERRUNDUNG9_R)

    # Skizze15 → Schnitt-Linear austragen6 (cut, through all)
    with BuildSketch(Plane(origin=(9.4e-16, 2.9999999999999933, 0), x_dir=(-1, 3.1e-16, 0), z_dir=(-3.1e-16, -1, 0))):
        with Locations(Location((82.49999999999999, -36.22044840963421, 0), (0, 0, 180))):
            Circle(SKIZZE15_R)
        with Locations((47.499999999999986, -36.22044840963421)):
            Circle(SKIZZE15_R)
        with Locations((-102.50000000000001, -36.22044840963421)):
            Circle(SKIZZE15_R)
        with Locations(Location((-67.5, -36.22044840963421, 0), (0, 0, 180))):
            Circle(SKIZZE15_R)
    extrude(amount=SCHNITT_LINEAR_AUSTRAGEN6_DEPTH, mode=Mode.SUBTRACT)

    # Verrundung10
    verrundung10_edges = [body_2_1.edges().sort_by_distance(p)[0] for p in [
        (129.01622804444872, 71.79688088456409, 18.838038459376516),
        (60.00000000000001, 57.828683821441146, 2.1913894273360848),
    ]]
    fillet(verrundung10_edges, radius=VERRUNDUNG10_R)

    # Skizze18 → Schnitt-Linear austragen8 (cut)
    with BuildSketch(Plane(origin=(0, 38.601549366392945, -32.39054583621226), x_dir=(1, 0, 0), z_dir=(0, 0.7660444431189745, -0.6427876096865438))):
        with Locations((10.000000000000039, -17.05785464004297)):
            Rectangle(SKIZZE18_W, SKIZZE18_H)
    extrude(amount=-SCHNITT_LINEAR_AUSTRAGEN8_DEPTH, mode=Mode.SUBTRACT)

    # Verrundung12
    verrundung12_edges = [body_2_1.edges().sort_by_distance(p)[0] for p in [
        (102.5, 10.725782333347924, 32.97909785640016),
        (67.5, 10.725782333347862, 32.97909785640016),
    ]]
    fillet(verrundung12_edges, radius=VERRUNDUNG12_R)

    # Verrundung13
    verrundung13_edges = [body_2_1.edges().sort_by_distance(p)[0] for p in [
        (-39.999999999999986, 55.91357271364369, 3.7983584515524607),
    ]]
    fillet(verrundung13_edges, radius=VERRUNDUNG13_R)

    # Skizze16 → Schnitt-Linear austragen7 (cut, through all)
    with BuildSketch(Plane(origin=(-40.000000000000036, 2.666e-14, 3.177e-14), x_dir=(-7.9e-16, 0, -1), z_dir=(1, -6.7e-16, -7.9e-16))):
        with Locations((7.488259970443778, 22.25050331384182)):
            Circle(SKIZZE16_R)
    extrude(amount=-SCHNITT_LINEAR_AUSTRAGEN7_DEPTH, mode=Mode.SUBTRACT)

    # Skizze19 → Schnitt-Linear austragen9 (cut)
    with BuildSketch(Plane.ZY.offset(-60.00000000000004)):
        with Locations((-22.394187380356886, 34.29602854135633)):
            Circle(SKIZZE19_R)
        with Locations((-22.394187380356886, 3.296028541356328)):
            Circle(SKIZZE19_R_2)
    extrude(amount=-SCHNITT_LINEAR_AUSTRAGEN9_DEPTH, mode=Mode.SUBTRACT)

    # Skizze20 → Aufsatz-Linear austragen11 (add)
    # profile 1 of 3: a face of its own
    with BuildSketch(Plane.ZY.offset(-60.00000000000004)):
        Polygon((-24.894187380356882, 1.819e-14), (-19.894187380356886, 1.819e-14), (-18.594187380356885, 1.833e-14), (-18.594187380356885, 6.592057082712639), (-19.894187380356886, 6.592057082712637), (-24.894187380356882, 6.592057082712637), (-26.194187380356883, 6.592057082712638), (-26.194187380356883, 1.74e-14), align=None)
        with Locations((-22.394187380356886, 3.2960285413563275)):
            Circle(SKIZZE20_R, mode=Mode.SUBTRACT)
    # profile 2 of 3: a face of its own
    with BuildSketch(Plane.ZY.offset(-60.00000000000004)):
        with Locations((-22.394187380356886, 3.2960285413563275)):
            Circle(SKIZZE20_R)
        with Locations((-22.394187380356886, 3.296028541356328)):
            Circle(SKIZZE20_R_2, mode=Mode.SUBTRACT)
    # profile 3 of 3: a face of its own
    with BuildSketch(Plane.ZY.offset(-60.00000000000004)):
        with BuildLine():
            Line((-26.194187380356883, 36.595069086283004), (-26.194187380356883, 30.496028541356324))
            Line((-26.194187380356883, 30.496028541356324), (-18.594187380356882, 30.496028541356324))
            Line((-18.594187380356882, 30.496028541356324), (-18.594187380356882, 38.09602854135633))
            Line((-18.594187380356882, 38.09602854135633), (-25.36693774168257, 38.096028541356326))
            ThreePointArc((-25.36693774168257, 38.09602854135633), (-25.78471844481995, 37.34783931764406), (-26.194187380356887, 36.595069086283004))
        make_face()
        with Locations((-22.394187380356886, 34.29602854135633)):
            Circle(SKIZZE20_R_3, mode=Mode.SUBTRACT)
    extrude(amount=AUFSATZ_LINEAR_AUSTRAGEN11_DEPTH)

    # Fase1
    fase1_edges = [body_2_1.edges().sort_by_distance(p)[0] for p in [
        (60.00000000000006, 3.2960285413563684, -18.59418738035684),
        (60.000000000000064, 3.296028541356368, -26.194187380356837),
        (60.00000000000006, 6.592057082712678, -22.39418738035684),
        (60.000000000000036, 34.29602854135637, -18.594187380356836),
        (60.00000000000004, 33.54554881381971, -26.194187380356837),
        (60.00000000000004, 30.496028541356363, -22.394187380356836),
    ]]
    chamfer(fase1_edges, length=FASE1_SIZE - 0.0001)  # a hair under: the kernel refuses the full size

    # Skizze21 → Schnitt-Linear austragen12 (cut)
    with BuildSketch(Plane(origin=(1.162e-14, 24.542302710435624, -35.22438658297153), x_dir=(-1, 1.5e-16, -2.2e-16), z_dir=(0, 0.5716668063955725, -0.820485869753701))):
        with Locations(Location((-67.50000000000006, 20.376936816014638, 0), (0, 0, 90))):
            Circle(SKIZZE21_R)
    extrude(amount=-SCHNITT_LINEAR_AUSTRAGEN12_DEPTH, mode=Mode.SUBTRACT)

    # Skizze22 → Schnitt-Linear austragen13 (cut)
    with BuildSketch(Plane(origin=(2.72e-14, 1.3735884689018287, -35.40021690632274), x_dir=(-1, 3e-17, -7.7e-16), z_dir=(0, 0.03877251997459974, -0.9992480631428913))):
        with Locations(Location((-67.50000000000006, 4.627635410153003, 0), (0, 0, 90))):
            Circle(SKIZZE22_R)
    extrude(amount=-SCHNITT_LINEAR_AUSTRAGEN13_DEPTH, mode=Mode.SUBTRACT)


solid = Compound([part.part, body_2_1.part])
